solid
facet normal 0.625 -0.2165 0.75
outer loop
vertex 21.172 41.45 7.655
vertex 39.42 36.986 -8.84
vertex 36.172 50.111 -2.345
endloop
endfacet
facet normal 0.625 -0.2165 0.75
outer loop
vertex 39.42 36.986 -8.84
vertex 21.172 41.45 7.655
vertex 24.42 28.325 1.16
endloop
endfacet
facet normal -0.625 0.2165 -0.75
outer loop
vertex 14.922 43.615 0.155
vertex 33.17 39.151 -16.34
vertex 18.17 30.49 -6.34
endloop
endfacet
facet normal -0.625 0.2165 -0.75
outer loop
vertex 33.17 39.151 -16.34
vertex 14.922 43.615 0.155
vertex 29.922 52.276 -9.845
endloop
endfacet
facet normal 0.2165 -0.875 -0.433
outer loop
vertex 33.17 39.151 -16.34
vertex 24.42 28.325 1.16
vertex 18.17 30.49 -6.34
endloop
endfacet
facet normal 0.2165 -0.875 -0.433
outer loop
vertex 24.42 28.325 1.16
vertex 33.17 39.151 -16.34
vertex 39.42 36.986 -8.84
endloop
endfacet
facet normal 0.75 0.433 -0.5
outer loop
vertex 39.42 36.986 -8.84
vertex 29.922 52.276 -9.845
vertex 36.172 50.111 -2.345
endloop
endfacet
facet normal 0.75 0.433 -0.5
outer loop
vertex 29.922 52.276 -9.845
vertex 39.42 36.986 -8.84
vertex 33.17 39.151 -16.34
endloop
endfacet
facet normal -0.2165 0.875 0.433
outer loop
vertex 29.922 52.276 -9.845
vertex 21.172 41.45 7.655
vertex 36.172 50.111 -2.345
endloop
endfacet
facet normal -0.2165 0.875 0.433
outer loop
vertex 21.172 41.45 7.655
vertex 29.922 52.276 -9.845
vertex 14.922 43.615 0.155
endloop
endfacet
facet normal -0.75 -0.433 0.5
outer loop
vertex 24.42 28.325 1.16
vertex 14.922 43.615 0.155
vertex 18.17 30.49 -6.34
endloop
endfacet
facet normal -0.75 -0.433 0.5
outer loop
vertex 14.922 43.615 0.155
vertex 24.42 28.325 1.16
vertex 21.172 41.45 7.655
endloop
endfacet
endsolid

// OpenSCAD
// Generated by generate_scads.py
rotate([30,30,30]) {
  translate([30,20,0]) {
    cube(size=[20,15,10], center=false);
  }
}
